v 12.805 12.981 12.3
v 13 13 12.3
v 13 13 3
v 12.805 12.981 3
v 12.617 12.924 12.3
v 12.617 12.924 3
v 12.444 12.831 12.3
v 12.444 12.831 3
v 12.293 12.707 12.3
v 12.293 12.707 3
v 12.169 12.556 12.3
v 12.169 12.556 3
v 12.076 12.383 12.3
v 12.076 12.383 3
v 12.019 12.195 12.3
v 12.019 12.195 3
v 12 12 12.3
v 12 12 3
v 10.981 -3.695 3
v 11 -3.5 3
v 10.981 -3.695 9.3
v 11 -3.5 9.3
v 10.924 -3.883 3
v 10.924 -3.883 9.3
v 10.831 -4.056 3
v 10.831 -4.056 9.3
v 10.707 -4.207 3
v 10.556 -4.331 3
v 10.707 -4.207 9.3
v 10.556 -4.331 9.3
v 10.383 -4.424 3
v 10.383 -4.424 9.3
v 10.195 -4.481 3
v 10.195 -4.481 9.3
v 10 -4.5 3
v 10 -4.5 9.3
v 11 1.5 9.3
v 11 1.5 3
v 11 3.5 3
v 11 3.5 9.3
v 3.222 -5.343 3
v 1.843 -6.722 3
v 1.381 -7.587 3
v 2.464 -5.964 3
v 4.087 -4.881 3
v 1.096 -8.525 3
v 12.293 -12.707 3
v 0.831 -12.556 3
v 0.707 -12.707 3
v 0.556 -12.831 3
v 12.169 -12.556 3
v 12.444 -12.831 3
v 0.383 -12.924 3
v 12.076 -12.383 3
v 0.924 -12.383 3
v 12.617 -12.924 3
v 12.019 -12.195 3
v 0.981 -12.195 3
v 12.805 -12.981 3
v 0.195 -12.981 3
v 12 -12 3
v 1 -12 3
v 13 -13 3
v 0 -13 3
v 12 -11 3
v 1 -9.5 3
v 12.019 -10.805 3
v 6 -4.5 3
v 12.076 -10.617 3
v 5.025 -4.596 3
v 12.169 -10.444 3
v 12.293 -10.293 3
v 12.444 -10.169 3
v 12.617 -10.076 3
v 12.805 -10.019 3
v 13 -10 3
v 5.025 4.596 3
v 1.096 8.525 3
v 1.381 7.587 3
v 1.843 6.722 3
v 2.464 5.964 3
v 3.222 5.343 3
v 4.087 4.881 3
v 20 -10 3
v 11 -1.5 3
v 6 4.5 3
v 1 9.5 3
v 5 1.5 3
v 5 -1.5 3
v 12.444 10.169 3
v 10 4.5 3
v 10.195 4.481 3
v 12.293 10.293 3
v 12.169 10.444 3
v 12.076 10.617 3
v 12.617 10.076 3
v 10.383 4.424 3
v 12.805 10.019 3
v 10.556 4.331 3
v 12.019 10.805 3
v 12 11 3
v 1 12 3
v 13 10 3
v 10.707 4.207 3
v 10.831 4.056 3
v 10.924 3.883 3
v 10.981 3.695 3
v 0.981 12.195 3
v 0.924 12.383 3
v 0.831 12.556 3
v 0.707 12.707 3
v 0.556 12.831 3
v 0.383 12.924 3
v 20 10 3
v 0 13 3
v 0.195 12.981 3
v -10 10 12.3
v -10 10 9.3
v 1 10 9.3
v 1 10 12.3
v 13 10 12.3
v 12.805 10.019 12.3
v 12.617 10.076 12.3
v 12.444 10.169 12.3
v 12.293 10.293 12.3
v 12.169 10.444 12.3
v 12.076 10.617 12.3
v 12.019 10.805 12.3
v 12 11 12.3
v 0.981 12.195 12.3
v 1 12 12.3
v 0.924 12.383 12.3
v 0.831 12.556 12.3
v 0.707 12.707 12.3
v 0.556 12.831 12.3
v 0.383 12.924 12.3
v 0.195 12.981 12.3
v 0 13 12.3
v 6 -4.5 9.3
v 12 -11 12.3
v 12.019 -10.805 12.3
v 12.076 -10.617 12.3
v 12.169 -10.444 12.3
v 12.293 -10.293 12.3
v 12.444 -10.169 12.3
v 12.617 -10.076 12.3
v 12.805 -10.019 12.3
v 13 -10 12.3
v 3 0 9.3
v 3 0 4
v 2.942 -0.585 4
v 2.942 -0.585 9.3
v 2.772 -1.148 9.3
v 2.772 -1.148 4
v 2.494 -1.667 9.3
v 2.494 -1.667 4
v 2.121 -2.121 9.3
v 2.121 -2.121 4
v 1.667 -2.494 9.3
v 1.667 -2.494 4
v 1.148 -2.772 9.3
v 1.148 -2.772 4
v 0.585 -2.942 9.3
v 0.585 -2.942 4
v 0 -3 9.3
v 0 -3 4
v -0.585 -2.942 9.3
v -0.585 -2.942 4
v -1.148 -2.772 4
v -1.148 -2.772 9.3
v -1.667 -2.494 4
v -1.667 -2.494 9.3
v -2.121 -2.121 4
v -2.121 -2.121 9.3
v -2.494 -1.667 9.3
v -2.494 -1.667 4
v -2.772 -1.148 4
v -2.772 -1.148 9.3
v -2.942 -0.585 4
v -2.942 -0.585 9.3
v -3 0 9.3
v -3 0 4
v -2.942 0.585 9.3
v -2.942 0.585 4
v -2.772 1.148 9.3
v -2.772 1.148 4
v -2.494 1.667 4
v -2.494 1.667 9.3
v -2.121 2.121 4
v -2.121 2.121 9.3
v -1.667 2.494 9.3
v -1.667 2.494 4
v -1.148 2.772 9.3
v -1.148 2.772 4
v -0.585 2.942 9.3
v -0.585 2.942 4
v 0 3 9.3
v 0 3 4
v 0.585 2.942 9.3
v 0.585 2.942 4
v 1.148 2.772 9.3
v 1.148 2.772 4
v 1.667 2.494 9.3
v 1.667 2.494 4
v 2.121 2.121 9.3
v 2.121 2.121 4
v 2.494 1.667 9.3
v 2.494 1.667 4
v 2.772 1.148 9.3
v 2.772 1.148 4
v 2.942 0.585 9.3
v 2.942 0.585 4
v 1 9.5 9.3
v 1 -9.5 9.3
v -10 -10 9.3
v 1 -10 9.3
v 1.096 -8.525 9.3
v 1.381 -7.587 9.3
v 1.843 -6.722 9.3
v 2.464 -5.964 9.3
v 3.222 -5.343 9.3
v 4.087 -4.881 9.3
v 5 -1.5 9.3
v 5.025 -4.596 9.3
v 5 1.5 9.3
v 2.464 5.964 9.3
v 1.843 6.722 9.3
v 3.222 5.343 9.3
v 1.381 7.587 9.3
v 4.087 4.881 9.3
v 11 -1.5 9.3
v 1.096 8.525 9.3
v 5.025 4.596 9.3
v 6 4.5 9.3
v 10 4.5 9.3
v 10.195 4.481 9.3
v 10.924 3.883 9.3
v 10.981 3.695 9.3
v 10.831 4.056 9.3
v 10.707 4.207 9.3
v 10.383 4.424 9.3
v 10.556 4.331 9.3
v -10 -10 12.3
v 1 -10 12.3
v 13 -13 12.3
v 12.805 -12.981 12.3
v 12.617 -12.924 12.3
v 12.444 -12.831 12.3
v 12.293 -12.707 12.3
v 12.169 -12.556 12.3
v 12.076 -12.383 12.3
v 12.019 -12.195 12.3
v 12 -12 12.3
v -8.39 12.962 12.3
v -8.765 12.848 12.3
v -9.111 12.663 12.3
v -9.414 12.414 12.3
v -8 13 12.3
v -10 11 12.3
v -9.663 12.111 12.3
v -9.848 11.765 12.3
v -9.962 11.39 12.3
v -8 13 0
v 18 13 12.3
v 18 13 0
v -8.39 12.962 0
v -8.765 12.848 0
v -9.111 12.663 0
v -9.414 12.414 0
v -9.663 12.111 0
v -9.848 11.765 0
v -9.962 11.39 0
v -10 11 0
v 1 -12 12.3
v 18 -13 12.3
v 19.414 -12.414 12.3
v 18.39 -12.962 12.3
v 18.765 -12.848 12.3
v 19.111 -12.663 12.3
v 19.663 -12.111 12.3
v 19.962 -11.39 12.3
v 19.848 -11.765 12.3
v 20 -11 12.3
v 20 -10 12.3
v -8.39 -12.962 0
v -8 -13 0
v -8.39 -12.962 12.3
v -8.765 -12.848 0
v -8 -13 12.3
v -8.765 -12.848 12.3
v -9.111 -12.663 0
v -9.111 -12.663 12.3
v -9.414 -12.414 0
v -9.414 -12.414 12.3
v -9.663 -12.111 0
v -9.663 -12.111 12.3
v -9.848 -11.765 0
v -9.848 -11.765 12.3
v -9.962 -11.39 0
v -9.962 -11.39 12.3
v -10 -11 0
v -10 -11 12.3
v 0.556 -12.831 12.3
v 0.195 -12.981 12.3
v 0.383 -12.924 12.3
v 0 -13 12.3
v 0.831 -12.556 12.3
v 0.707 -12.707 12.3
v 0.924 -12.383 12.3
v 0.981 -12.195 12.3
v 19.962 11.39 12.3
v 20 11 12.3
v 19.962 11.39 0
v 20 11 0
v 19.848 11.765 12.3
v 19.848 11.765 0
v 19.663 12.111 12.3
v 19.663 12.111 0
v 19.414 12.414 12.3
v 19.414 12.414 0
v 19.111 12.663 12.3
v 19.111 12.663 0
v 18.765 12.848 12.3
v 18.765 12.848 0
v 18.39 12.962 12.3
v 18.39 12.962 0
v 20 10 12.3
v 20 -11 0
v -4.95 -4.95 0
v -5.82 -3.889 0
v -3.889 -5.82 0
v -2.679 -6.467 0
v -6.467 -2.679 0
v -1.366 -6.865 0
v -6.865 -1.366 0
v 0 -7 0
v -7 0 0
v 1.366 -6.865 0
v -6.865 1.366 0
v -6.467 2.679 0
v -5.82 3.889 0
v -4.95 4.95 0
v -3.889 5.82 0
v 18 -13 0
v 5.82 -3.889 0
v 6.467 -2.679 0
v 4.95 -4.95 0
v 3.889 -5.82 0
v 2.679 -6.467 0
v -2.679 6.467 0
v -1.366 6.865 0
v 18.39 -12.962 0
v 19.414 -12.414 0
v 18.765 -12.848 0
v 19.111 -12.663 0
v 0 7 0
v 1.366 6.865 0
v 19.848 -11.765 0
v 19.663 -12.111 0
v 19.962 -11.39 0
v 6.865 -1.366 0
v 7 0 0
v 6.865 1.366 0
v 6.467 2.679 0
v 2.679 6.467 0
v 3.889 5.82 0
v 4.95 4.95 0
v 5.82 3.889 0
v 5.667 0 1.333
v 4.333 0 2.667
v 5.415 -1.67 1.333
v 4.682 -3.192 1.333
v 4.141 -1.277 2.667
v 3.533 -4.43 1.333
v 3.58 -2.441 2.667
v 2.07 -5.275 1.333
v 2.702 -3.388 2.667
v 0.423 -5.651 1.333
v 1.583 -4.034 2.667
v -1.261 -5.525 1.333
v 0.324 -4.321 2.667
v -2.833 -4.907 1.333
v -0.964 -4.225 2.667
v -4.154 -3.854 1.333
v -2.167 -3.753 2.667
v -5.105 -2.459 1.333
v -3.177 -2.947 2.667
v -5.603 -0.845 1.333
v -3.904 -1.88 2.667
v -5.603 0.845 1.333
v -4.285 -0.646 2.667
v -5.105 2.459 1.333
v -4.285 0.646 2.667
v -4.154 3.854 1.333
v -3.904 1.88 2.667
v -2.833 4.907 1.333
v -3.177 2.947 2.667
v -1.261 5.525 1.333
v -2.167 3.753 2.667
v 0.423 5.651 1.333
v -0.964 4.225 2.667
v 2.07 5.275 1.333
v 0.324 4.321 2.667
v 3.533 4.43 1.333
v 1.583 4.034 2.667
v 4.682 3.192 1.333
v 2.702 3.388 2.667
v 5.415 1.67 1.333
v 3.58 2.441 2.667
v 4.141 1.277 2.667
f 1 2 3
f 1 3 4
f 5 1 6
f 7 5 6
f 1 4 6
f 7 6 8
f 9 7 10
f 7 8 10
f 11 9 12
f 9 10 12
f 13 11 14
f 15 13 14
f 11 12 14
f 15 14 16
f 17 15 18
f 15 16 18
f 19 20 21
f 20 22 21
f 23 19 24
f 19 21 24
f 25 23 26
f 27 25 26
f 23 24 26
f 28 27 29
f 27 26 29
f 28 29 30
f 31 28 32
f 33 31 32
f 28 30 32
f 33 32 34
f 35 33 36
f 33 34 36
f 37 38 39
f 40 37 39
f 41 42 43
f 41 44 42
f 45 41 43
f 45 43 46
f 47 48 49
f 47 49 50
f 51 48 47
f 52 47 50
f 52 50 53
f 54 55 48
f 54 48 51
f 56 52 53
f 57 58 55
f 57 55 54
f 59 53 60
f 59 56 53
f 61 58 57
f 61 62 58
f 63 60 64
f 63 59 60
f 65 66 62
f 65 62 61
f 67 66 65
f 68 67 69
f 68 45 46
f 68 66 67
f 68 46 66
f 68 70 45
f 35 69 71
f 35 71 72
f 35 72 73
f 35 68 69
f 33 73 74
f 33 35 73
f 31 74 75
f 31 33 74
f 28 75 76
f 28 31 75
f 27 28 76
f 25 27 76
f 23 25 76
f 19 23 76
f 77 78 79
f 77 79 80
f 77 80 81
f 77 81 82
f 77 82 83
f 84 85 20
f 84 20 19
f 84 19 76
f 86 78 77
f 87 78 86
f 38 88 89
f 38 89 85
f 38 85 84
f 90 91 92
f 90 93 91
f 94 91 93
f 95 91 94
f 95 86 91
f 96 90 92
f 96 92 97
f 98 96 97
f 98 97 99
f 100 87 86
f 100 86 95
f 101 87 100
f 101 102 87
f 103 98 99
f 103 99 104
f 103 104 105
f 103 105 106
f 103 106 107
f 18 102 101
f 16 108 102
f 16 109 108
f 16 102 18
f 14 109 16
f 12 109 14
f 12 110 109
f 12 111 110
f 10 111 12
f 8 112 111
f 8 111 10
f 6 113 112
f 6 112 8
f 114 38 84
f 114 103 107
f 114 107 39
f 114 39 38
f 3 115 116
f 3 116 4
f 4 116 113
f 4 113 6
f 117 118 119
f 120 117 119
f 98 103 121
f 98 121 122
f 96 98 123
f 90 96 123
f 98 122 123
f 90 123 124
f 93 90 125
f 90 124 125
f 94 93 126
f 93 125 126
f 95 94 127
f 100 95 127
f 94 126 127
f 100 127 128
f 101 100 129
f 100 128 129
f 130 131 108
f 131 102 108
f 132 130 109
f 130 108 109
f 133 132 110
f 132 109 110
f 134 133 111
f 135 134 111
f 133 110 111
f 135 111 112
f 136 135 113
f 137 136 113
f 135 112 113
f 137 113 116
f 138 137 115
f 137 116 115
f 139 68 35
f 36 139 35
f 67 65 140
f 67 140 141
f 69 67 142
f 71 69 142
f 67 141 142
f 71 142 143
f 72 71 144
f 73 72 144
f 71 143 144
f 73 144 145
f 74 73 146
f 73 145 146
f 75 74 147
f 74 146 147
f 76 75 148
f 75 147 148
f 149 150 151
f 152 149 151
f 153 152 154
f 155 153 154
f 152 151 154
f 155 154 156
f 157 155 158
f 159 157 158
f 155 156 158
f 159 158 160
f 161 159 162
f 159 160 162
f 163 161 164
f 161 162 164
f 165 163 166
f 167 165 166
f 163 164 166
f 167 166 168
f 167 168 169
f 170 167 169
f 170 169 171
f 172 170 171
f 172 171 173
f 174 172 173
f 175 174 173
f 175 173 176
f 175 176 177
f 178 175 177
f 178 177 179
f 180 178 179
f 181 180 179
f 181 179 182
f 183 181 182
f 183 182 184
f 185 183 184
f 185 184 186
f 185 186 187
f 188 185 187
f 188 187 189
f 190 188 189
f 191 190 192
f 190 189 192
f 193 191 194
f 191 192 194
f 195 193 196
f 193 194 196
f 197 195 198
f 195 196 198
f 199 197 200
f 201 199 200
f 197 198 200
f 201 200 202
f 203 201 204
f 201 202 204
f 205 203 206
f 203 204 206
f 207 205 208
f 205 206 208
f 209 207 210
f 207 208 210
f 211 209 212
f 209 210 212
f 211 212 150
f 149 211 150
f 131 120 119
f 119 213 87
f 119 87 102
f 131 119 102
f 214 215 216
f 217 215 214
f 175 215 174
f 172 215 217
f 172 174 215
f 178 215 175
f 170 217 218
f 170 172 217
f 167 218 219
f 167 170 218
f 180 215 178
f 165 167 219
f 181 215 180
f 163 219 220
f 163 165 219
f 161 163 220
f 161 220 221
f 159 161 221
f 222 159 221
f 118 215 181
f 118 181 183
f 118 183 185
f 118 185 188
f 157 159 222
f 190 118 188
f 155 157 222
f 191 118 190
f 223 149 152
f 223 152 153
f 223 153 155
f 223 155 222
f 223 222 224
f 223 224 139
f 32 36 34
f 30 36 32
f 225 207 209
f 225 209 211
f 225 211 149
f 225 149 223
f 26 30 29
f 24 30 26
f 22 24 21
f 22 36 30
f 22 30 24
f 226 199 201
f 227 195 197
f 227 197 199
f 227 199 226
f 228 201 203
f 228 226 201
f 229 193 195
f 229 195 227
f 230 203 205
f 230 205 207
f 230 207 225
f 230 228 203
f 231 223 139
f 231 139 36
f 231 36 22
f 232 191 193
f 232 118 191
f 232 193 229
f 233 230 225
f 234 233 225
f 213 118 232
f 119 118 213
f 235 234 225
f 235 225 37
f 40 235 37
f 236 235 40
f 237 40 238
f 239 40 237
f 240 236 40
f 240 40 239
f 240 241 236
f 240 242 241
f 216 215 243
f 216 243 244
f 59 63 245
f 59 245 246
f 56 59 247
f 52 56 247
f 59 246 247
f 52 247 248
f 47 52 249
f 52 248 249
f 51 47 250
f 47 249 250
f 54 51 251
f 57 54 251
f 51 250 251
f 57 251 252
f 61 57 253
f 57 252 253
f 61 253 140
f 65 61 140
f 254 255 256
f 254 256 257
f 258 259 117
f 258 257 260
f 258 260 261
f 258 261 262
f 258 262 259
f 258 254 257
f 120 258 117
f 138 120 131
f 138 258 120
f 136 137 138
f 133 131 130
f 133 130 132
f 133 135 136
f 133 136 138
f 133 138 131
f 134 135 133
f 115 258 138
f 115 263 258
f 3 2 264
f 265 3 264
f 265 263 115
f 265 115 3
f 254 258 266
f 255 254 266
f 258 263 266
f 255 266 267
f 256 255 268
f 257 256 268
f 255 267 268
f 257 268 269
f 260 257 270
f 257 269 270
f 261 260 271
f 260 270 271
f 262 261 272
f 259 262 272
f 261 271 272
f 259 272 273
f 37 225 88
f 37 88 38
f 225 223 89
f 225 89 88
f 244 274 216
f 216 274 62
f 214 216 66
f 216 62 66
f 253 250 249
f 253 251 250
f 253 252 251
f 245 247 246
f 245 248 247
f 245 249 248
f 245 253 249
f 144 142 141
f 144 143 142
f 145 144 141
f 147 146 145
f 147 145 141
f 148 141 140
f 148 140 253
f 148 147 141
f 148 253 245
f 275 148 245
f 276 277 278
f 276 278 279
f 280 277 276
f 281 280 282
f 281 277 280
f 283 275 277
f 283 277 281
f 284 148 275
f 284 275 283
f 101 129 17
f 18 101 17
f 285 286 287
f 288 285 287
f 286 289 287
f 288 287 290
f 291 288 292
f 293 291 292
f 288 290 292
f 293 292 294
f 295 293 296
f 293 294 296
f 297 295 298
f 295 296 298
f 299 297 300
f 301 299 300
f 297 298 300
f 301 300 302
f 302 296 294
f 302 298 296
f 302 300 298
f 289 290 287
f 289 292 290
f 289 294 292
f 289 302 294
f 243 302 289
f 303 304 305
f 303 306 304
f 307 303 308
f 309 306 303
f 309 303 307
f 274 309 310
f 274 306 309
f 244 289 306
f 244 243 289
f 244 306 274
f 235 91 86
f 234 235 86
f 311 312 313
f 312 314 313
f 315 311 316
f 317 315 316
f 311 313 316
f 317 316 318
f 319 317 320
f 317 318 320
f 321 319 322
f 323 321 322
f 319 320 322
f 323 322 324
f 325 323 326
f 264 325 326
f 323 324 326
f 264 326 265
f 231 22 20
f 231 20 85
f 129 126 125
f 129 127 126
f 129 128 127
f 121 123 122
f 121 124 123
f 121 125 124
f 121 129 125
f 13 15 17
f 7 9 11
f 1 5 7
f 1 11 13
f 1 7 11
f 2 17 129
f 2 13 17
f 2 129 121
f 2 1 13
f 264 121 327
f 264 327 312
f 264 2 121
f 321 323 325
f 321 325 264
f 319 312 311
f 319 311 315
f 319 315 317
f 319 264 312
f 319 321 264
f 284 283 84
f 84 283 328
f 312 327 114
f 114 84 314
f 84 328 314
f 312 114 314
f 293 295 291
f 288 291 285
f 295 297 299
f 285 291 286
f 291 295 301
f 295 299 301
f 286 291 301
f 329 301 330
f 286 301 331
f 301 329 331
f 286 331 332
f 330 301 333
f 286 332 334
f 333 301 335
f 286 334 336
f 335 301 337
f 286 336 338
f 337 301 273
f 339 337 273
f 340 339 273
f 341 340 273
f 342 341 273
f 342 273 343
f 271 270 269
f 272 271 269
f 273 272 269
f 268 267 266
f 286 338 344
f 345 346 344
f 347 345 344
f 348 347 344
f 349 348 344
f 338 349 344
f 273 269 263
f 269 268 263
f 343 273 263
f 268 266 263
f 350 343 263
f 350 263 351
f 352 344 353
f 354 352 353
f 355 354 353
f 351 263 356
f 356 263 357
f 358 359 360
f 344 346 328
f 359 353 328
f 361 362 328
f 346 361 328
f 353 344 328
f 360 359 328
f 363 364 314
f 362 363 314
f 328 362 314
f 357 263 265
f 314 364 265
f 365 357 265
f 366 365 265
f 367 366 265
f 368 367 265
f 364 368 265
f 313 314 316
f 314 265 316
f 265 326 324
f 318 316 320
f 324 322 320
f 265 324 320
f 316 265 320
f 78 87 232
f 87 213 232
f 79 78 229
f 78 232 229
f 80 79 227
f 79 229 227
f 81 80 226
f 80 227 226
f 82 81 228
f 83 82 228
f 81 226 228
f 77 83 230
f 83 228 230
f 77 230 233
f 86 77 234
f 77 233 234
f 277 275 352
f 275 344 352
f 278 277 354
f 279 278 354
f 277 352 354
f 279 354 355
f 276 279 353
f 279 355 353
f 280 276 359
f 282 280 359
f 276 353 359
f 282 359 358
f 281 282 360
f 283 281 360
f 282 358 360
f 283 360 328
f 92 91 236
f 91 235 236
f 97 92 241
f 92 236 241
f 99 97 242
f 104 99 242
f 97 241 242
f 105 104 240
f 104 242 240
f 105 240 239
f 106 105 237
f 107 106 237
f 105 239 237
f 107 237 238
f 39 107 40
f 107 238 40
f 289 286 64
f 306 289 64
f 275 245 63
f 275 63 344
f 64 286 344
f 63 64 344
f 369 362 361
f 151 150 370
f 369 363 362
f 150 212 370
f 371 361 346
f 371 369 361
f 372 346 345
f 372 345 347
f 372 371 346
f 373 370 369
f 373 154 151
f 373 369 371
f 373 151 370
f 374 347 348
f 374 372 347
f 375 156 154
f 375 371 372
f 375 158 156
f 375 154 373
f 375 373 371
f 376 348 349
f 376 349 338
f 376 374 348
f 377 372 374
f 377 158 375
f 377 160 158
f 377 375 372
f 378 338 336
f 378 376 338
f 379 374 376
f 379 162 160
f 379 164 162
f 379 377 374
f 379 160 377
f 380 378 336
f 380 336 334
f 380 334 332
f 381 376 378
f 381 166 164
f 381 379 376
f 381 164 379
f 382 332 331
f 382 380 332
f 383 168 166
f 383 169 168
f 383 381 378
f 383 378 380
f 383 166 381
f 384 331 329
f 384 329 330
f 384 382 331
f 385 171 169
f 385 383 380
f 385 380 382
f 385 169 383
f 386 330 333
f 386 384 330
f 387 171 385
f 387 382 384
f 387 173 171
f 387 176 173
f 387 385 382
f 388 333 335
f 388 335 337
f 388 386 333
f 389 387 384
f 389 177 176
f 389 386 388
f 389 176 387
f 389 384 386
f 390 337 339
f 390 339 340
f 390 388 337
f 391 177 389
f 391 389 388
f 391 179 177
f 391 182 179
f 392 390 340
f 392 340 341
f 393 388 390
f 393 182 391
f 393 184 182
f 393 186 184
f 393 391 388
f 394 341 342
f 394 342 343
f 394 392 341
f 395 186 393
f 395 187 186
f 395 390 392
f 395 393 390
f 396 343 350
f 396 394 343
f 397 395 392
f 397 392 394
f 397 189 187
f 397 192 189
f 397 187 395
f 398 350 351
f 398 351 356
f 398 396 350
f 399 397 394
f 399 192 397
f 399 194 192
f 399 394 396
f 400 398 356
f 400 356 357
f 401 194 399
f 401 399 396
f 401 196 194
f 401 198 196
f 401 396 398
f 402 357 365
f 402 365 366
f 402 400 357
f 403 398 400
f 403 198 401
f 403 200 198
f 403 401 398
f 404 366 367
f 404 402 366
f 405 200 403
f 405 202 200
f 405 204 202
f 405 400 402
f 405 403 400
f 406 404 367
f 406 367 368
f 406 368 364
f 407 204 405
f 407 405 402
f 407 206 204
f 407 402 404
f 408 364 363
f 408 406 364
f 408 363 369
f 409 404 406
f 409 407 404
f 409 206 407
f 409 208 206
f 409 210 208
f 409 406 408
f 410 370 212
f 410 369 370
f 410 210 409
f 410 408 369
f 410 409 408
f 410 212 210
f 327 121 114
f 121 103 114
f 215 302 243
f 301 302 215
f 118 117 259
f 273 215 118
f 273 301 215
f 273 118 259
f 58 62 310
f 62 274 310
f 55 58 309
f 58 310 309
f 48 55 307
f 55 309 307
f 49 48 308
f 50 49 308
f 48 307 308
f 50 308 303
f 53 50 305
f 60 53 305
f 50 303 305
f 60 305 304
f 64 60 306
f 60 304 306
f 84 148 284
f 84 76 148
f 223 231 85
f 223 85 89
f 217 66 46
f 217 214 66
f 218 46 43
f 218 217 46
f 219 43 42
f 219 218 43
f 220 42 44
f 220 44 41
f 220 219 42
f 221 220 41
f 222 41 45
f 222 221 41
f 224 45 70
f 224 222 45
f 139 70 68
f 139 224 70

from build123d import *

# Parameters (mm, degrees)
PAD_DEPTH       = 3
SKETCH001_W     = 8
SKETCH001_H     = 3
PAD001_DEPTH    = 6.3
SKETCH002_W     = 8
SKETCH002_H     = 3
SKETCH002_W_2   = 21
PAD002_DEPTH    = 3
SKETCH003_R     = 3
POCKET_DEPTH    = 20
CHAMFER_SIZE2   = 4
CHAMFER_SIZE    = 4
FILLET001_R     = 5
FILLET002_R     = 1
POCKET001_DEPTH = 10
FILLET_R        = 2


with BuildPart() as part:
    # Sketch → Pad (new body)
    with BuildSketch(Plane.XY):
        Polygon((20, -10), (20, 10), (20, 13), (-20, 13), (-20, 10), (-20, -10), (-20, -13), (20, -13), align=None)
    extrude(amount=PAD_DEPTH)

    # Sketch001 (on Face4 of Pad) → Pad001 (join)
    with BuildSketch(Plane.XY.offset(3)):
        with Locations((16, 11.5)):
            Rectangle(SKETCH001_W, SKETCH001_H)
        with Locations((16, -11.5)):
            Rectangle(SKETCH001_W, SKETCH001_H)
        Polygon((11, 1.5), (11, 4.5), (1, 4.5), (1, 13), (-20, 13), (-20, -13), (1, -13), (1, -4.5), (11, -4.5), (11, -1.5), (5, -1.5), (5, 1.5), align=None)
    extrude(amount=PAD001_DEPTH)

    # Sketch002 (on Face5 of Pad001) → Pad002 (join)
    with BuildSketch(Plane.XY.offset(9.3)):
        with Locations((16, 11.5)):
            Rectangle(SKETCH002_W, SKETCH002_H)
        with Locations((-9.5, 11.5)):
            Rectangle(SKETCH002_W_2, SKETCH002_H)
        with Locations((16, -11.5)):
            Rectangle(SKETCH002_W, SKETCH002_H)
        with Locations((-9.5, -11.5)):
            Rectangle(SKETCH002_W_2, SKETCH002_H)
    extrude(amount=PAD002_DEPTH)

    # Sketch003 (on Face1 of Pad002) → Pocket (cut)
    with BuildSketch(Plane(origin=(0, 0, 0), x_dir=(1, 0, 0), z_dir=(0, 0, -1))):
        Circle(SKETCH003_R)
    extrude(amount=-POCKET_DEPTH, mode=Mode.SUBTRACT)

    # Chamfer
    chamfer_edges = [part.edges().sort_by_distance(p)[0] for p in [
        (-3, 0, 0),
    ]]
    chamfer_side = part.faces().sort_by_distance((-19.522926, 0, 0))[0]
    chamfer(chamfer_edges, length=CHAMFER_SIZE, length2=CHAMFER_SIZE2, reference=chamfer_side)

    # Fillet001
    fillet001_edges = [part.edges().sort_by_distance(p)[0] for p in [
        (1, 4.5, 6.15),
        (1, -4.5, 6.15),
    ]]
    fillet(fillet001_edges, radius=FILLET001_R)

    # Fillet002
    fillet002_edges = [part.edges().sort_by_distance(p)[0] for p in [
        (11, 4.5, 6.15),
        (12, 10, 7.65),
        (11, -4.5, 6.15),
        (12, -10, 7.65),
        (1, 13, 7.65),
        (12, 13, 7.65),
        (1, -13, 7.65),
        (12, -13, 7.65),
    ]]
    fillet(fillet002_edges, radius=FILLET002_R)

    # Fillet002 Face10 → Pocket001 (cut)
    with BuildSketch(Plane(origin=(-20, 0, 5.076097), x_dir=(0, 1, 0), z_dir=(-1, 0, 0))):
        Polygon((13, 5.076097), (-13, 5.076097), (-13, -7.223903), (-10, -7.223903), (-10, -4.223903), (10, -4.223903), (10, -7.223903), (13, -7.223903), align=None)
    extrude(amount=-POCKET001_DEPTH, mode=Mode.SUBTRACT)

    # Fillet
    fillet_edges = [part.edges().sort_by_distance(p)[0] for p in [
        (-10, 13, 6.15),
        (20, 13, 6.15),
        (20, -13, 6.15),
        (-10, -13, 6.15),
    ]]
    fillet(fillet_edges, radius=FILLET_R)


solid = part.part
